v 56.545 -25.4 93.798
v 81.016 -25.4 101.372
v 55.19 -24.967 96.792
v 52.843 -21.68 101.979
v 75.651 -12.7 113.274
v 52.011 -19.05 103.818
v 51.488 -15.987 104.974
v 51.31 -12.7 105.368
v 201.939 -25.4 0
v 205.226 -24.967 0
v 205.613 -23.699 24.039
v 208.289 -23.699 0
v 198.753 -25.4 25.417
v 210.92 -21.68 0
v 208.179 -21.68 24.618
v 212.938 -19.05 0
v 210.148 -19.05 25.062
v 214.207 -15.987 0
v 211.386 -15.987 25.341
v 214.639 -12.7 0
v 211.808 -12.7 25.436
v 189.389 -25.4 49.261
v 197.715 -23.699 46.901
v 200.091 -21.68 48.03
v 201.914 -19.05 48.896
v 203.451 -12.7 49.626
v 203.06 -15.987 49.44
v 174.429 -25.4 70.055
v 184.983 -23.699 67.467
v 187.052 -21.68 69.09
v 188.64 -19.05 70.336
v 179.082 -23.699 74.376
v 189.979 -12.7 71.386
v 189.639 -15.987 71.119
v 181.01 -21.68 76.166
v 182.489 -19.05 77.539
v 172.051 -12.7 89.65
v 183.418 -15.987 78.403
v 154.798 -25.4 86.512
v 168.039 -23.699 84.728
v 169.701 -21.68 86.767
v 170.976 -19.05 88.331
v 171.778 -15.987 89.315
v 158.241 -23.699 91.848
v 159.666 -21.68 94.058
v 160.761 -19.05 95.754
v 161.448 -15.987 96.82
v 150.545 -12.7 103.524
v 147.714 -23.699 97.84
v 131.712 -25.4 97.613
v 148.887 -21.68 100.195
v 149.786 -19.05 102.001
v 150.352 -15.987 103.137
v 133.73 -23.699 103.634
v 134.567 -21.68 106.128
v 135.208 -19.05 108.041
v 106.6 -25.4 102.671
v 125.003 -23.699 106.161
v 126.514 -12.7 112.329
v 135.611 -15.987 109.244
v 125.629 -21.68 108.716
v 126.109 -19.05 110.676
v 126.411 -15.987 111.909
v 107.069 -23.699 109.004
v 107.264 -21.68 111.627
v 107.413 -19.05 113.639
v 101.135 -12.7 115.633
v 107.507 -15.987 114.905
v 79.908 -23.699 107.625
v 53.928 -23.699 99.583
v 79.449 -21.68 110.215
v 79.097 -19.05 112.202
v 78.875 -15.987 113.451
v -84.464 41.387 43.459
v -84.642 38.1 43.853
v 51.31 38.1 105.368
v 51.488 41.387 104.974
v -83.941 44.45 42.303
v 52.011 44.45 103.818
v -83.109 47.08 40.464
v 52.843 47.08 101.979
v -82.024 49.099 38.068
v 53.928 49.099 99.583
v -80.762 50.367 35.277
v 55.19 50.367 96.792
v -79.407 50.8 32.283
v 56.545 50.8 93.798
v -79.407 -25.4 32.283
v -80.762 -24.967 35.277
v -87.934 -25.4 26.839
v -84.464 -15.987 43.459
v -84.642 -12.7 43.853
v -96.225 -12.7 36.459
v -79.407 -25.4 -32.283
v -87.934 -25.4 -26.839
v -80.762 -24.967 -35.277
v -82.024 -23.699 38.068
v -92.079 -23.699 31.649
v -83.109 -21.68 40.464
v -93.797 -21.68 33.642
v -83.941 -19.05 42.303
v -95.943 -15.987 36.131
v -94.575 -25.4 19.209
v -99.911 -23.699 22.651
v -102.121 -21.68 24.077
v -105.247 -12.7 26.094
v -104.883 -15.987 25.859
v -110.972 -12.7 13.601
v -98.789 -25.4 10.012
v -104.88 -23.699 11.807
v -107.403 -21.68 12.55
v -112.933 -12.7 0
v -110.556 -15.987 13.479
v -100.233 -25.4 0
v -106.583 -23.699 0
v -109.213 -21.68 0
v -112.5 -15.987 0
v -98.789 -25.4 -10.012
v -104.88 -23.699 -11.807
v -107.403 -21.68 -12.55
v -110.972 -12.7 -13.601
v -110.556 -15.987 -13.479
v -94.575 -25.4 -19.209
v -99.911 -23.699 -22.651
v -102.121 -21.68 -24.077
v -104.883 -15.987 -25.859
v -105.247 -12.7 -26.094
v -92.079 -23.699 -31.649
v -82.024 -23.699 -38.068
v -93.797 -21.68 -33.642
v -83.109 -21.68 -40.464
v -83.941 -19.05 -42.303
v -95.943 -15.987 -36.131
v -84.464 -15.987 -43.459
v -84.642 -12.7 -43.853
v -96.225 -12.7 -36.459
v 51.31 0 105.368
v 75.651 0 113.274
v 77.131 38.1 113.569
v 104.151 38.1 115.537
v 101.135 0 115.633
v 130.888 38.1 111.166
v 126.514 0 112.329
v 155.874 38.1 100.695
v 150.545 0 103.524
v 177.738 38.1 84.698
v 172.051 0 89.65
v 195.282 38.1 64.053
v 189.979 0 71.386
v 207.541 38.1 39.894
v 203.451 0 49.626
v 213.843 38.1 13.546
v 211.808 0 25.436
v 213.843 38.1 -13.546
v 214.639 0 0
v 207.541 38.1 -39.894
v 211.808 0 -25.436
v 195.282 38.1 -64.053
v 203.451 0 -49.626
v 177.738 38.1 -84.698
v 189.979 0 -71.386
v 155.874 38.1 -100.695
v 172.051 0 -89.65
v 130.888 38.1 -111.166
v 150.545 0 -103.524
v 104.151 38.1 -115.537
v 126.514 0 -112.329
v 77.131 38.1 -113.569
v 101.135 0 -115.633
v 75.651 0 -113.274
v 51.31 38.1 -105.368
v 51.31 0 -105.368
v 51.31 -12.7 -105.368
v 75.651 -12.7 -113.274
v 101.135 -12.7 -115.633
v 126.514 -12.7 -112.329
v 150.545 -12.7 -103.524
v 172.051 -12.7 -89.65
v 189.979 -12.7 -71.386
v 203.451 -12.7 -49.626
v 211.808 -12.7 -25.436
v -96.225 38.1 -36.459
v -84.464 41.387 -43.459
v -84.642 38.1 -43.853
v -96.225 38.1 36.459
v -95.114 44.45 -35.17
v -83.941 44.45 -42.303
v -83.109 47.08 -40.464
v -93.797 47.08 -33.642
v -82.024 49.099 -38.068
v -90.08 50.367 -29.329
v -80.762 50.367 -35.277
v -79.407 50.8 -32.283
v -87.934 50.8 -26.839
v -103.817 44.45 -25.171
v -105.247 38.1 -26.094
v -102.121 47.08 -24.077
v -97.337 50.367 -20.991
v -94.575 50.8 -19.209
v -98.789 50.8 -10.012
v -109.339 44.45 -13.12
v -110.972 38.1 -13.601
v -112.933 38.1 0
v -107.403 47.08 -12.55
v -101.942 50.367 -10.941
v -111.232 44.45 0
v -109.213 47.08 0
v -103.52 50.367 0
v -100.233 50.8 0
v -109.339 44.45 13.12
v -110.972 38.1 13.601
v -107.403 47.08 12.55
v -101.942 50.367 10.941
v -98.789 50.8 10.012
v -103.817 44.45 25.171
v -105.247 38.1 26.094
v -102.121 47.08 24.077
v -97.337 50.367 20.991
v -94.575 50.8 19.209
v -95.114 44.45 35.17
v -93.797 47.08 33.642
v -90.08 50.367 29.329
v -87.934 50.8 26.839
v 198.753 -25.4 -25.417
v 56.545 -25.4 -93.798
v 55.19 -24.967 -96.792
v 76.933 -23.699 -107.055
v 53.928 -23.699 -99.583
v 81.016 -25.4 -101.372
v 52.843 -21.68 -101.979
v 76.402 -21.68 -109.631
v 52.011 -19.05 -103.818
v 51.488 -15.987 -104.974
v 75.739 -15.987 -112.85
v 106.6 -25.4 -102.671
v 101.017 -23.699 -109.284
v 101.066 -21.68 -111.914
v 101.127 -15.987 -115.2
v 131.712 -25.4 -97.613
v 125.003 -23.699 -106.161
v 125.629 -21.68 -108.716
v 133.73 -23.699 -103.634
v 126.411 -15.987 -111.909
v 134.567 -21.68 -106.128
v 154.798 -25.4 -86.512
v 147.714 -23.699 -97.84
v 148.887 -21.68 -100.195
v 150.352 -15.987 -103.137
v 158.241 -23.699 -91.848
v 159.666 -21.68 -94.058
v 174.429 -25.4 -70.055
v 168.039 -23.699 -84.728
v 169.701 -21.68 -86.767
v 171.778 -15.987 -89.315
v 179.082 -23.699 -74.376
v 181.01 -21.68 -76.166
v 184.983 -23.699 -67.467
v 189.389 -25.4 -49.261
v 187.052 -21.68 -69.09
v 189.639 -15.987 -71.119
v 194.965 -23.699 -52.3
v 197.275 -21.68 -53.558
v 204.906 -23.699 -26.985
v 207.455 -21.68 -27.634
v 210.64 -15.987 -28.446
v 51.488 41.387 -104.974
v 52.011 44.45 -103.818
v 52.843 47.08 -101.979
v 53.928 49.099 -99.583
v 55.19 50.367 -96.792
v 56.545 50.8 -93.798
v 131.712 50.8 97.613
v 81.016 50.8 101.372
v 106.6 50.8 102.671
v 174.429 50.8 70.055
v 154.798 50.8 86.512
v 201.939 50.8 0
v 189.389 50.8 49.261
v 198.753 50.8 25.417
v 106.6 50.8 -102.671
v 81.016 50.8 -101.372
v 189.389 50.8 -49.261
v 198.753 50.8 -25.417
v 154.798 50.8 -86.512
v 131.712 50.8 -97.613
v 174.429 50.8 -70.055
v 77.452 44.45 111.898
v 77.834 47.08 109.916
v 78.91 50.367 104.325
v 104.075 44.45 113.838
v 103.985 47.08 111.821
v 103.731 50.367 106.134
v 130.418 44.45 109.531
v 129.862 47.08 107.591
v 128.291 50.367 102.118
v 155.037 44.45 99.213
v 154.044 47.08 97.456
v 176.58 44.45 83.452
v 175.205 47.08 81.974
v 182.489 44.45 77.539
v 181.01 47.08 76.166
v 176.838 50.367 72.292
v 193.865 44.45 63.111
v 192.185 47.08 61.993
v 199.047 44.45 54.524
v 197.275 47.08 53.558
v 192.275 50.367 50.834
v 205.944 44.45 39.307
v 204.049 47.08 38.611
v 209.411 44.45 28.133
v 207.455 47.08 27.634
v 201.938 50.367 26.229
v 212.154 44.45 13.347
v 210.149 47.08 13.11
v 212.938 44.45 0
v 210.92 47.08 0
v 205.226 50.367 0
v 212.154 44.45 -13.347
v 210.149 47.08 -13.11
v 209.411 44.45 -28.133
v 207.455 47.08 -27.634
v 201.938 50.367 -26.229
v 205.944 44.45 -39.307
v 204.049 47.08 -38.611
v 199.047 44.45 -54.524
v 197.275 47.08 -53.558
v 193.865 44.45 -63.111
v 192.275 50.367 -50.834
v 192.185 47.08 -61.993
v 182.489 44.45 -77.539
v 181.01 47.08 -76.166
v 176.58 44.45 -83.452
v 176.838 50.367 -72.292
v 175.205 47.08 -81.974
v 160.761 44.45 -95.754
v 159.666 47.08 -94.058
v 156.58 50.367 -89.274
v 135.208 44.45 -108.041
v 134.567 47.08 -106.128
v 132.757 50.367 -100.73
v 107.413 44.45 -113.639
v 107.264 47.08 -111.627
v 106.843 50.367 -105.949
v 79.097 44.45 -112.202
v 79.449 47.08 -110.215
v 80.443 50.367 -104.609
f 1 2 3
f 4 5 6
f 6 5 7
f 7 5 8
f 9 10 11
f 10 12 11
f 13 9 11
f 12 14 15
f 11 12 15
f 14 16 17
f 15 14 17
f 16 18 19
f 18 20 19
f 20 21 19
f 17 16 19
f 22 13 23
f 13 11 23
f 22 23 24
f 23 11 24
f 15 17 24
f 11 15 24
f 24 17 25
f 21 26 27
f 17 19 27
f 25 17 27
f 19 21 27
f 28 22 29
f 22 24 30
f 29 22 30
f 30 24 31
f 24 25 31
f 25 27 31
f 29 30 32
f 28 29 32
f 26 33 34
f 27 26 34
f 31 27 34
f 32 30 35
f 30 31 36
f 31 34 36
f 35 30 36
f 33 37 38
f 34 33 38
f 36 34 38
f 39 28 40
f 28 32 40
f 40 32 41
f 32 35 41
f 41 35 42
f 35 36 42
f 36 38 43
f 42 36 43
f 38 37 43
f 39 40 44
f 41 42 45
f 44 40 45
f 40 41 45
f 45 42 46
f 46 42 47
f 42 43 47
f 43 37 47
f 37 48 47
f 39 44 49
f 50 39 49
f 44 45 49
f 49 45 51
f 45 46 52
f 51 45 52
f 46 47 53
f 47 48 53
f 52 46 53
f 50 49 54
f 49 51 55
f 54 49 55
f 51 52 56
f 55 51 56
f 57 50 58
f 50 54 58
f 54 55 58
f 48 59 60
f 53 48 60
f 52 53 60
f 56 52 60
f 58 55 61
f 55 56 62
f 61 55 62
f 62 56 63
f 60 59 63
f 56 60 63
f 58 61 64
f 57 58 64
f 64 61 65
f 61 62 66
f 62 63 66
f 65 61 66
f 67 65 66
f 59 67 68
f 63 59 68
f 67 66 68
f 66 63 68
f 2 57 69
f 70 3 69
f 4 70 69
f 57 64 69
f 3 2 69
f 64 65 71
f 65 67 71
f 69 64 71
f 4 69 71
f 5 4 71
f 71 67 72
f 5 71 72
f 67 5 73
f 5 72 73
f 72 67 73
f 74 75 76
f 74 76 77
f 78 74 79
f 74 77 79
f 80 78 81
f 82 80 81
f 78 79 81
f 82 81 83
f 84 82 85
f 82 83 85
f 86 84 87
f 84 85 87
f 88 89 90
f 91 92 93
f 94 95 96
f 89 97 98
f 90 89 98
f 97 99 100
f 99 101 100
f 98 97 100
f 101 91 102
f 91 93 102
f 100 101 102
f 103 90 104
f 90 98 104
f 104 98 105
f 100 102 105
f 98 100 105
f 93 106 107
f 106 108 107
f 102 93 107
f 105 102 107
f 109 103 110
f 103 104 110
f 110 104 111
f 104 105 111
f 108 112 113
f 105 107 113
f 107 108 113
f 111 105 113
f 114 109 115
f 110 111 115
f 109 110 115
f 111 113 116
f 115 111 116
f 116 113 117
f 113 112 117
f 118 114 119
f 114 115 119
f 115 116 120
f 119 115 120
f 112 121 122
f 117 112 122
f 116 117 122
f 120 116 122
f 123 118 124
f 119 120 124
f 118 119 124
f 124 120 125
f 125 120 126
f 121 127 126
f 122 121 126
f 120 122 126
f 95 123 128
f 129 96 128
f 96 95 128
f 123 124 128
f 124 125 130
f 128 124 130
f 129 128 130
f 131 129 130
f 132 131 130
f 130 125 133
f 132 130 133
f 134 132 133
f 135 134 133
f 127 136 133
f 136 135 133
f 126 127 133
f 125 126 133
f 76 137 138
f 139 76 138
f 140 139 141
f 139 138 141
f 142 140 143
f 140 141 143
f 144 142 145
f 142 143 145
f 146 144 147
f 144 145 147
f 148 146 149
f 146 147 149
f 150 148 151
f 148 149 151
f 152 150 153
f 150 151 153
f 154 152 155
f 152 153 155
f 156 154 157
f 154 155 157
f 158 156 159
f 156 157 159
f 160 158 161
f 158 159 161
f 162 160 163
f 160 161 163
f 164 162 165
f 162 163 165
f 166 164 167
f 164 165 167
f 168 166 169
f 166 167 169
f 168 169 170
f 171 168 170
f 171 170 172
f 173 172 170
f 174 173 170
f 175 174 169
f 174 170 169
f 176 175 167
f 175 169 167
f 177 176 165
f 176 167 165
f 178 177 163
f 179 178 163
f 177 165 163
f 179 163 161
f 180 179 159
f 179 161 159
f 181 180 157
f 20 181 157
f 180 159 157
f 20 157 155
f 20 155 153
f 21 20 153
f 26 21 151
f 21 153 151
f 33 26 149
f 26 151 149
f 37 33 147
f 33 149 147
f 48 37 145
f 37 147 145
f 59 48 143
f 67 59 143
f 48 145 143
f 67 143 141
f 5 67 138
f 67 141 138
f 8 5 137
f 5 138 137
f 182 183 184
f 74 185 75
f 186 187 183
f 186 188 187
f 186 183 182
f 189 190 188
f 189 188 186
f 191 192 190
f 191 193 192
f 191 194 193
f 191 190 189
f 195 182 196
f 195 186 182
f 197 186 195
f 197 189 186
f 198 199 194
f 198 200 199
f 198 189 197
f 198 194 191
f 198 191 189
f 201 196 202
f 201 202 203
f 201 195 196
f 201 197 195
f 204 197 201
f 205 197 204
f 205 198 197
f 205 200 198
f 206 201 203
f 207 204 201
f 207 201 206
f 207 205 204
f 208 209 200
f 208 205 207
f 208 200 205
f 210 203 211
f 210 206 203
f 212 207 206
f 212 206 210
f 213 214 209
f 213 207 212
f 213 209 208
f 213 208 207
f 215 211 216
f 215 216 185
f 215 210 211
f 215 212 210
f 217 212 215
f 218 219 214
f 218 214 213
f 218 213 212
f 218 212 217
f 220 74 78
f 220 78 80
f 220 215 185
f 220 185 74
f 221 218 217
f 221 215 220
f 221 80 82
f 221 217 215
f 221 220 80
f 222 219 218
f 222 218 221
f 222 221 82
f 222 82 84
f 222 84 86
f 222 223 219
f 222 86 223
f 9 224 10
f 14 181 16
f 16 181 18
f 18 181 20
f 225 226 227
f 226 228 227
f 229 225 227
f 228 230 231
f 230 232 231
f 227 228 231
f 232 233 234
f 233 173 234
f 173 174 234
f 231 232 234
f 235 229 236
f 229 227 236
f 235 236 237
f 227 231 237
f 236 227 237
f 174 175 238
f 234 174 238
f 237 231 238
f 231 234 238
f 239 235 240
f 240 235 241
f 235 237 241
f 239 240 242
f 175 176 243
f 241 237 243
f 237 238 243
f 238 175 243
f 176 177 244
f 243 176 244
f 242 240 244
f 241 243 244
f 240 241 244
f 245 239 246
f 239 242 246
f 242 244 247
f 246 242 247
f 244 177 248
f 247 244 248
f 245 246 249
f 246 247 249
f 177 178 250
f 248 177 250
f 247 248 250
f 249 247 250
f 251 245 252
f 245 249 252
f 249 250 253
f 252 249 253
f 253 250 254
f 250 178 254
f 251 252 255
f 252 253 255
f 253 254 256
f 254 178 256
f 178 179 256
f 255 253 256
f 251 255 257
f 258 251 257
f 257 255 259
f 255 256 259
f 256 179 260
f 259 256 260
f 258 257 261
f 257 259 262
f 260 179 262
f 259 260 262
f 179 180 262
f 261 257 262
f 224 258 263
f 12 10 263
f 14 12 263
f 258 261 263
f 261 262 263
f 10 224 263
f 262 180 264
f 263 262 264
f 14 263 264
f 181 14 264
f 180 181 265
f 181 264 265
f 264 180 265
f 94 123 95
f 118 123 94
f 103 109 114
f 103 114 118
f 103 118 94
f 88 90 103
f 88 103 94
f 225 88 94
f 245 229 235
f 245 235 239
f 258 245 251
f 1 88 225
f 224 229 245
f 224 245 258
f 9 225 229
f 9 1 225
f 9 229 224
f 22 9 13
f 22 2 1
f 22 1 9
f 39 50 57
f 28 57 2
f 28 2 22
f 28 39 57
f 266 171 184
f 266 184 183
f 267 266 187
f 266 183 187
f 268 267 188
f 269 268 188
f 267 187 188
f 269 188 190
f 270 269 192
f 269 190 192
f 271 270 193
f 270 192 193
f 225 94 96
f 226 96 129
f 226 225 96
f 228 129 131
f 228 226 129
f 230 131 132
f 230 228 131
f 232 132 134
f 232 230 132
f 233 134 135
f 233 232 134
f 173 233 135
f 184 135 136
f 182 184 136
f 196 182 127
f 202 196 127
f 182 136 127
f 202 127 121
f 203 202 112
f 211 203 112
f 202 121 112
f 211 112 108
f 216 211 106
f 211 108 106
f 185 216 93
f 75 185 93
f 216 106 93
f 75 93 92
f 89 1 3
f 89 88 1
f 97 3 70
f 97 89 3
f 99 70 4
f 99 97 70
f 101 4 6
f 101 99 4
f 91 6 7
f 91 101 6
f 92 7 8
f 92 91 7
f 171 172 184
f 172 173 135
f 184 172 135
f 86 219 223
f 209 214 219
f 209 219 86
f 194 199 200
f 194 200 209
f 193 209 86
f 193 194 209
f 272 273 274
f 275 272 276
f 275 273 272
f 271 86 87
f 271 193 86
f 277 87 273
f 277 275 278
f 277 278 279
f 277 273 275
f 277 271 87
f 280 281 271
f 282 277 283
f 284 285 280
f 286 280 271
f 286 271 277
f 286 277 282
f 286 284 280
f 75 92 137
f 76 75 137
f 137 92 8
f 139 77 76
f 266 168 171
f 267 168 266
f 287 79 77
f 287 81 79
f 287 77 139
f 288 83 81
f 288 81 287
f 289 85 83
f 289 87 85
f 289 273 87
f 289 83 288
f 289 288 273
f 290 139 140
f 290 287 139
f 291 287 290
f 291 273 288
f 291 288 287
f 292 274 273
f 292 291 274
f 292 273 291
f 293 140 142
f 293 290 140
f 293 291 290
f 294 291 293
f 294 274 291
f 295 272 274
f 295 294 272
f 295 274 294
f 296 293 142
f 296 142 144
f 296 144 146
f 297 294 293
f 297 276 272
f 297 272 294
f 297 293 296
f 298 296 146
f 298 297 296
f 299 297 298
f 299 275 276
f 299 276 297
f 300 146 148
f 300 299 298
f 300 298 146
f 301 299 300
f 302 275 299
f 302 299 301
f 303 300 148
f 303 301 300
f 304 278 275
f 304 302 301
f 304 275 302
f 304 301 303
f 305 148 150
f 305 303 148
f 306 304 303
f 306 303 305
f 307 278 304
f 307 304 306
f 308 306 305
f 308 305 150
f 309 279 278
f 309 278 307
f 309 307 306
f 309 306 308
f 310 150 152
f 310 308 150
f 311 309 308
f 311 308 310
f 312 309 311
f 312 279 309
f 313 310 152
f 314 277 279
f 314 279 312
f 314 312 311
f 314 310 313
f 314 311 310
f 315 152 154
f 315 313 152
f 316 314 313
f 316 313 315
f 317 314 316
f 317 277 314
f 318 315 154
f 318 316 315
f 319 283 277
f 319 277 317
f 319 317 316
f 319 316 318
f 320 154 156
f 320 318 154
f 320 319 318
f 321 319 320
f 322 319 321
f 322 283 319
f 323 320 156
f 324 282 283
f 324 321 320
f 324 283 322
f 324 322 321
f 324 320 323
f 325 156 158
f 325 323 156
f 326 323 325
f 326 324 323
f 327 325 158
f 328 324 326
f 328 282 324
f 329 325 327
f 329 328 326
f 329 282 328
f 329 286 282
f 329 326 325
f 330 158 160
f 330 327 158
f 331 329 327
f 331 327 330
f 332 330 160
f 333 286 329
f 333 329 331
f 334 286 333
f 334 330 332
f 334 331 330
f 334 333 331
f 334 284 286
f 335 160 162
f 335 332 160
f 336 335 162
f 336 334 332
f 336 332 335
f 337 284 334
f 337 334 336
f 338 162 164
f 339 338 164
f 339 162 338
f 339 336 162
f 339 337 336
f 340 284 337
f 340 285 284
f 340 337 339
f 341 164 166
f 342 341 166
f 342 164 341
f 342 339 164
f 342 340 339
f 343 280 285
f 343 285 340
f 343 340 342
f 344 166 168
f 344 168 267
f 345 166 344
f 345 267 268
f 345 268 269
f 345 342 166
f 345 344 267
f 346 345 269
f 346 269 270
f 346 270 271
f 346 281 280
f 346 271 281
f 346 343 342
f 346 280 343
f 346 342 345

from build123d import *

# Parameters (mm, degrees)
F1_DEPTH = 25.4
F2_R     = 57.300749
F3_DEPTH = 25.4
F4_DEPTH = 50.8
F5_R     = 12.7
F6_R     = 12.7


with BuildPart() as f1:
    # F0 (on Front) → F1 (new body)
    with BuildSketch(Plane.XZ):
        with BuildLine():
            ThreePointArc((-84.642182, -43.85329), (-38.706084, -40.44707), (-16.666076, 0))
            ThreePointArc((-16.666076, 0), (-38.706084, 40.44707), (-84.642182, 43.85329))
            ThreePointArc((-84.642182, 43.85329), (-112.933167, 0), (-84.642182, -43.85329))
        make_face()
        with BuildLine():
            ThreePointArc((51.31003, -105.3684), (1.802586, -62.696194), (-16.666076, 0))
            ThreePointArc((-16.666076, 0), (-38.706084, -40.44707), (-84.642182, -43.85329))
            Line((-84.642182, -43.85329), (51.31003, -105.3684))
        make_face()
        with BuildLine():
            ThreePointArc((-84.642182, 43.85329), (-38.706084, 40.44707), (-16.666076, 0))
            ThreePointArc((-16.666076, 0), (1.802586, 62.696194), (51.31003, 105.3684))
            Line((51.31003, 105.3684), (-84.642182, 43.85329))
        make_face()
        with BuildLine():
            ThreePointArc((51.31003, 105.3684), (1.802586, 62.696194), (-16.666076, 0))
            ThreePointArc((-16.666076, 0), (1.802586, -62.696194), (51.31003, -105.3684))
            ThreePointArc((51.31003, -105.3684), (161.682894, -97.184114), (214.639476, 0))
            ThreePointArc((214.639476, 0), (161.682894, 97.184114), (51.31003, 105.3684))
        make_face()
    extrude(amount=F1_DEPTH)

    # F2 (on Front) → F3 (cut)
    with BuildSketch(Plane.XZ):
        with Locations((105.685264, 0)):
            Circle(F2_R)
    extrude(amount=-F3_DEPTH, mode=Mode.SUBTRACT)

    # F1_face (on face) → F4 (join)
    with BuildSketch(Plane(origin=(66.909918, 0, 0), x_dir=(1, 0, 0), z_dir=(0, 1, 0))):
        with BuildLine():
            ThreePointArc((-151.5521, 43.85329), (-179.843085, 0), (-151.5521, -43.85329))
            Line((-151.5521, -43.85329), (-15.599888, -105.3684))
            ThreePointArc((-15.599888, -105.3684), (147.729558, 0), (-15.599888, 105.3684))
            Line((-15.599888, 105.3684), (-151.5521, 43.85329))
        make_face()
    extrude(amount=F4_DEPTH)

    # F5
    f5_edges = [f1.edges().sort_by_distance(p)[0] for p in [
        (-16.666076, 50.8, 74.610845),
    ]]
    fillet(f5_edges, radius=F5_R)

    # F6
    f6_edges = [f1.edges().sort_by_distance(p)[0] for p in [
        (-16.666076, -25.4, 74.610845),
    ]]
    fillet(f6_edges, radius=F6_R)


solid = f1.part
